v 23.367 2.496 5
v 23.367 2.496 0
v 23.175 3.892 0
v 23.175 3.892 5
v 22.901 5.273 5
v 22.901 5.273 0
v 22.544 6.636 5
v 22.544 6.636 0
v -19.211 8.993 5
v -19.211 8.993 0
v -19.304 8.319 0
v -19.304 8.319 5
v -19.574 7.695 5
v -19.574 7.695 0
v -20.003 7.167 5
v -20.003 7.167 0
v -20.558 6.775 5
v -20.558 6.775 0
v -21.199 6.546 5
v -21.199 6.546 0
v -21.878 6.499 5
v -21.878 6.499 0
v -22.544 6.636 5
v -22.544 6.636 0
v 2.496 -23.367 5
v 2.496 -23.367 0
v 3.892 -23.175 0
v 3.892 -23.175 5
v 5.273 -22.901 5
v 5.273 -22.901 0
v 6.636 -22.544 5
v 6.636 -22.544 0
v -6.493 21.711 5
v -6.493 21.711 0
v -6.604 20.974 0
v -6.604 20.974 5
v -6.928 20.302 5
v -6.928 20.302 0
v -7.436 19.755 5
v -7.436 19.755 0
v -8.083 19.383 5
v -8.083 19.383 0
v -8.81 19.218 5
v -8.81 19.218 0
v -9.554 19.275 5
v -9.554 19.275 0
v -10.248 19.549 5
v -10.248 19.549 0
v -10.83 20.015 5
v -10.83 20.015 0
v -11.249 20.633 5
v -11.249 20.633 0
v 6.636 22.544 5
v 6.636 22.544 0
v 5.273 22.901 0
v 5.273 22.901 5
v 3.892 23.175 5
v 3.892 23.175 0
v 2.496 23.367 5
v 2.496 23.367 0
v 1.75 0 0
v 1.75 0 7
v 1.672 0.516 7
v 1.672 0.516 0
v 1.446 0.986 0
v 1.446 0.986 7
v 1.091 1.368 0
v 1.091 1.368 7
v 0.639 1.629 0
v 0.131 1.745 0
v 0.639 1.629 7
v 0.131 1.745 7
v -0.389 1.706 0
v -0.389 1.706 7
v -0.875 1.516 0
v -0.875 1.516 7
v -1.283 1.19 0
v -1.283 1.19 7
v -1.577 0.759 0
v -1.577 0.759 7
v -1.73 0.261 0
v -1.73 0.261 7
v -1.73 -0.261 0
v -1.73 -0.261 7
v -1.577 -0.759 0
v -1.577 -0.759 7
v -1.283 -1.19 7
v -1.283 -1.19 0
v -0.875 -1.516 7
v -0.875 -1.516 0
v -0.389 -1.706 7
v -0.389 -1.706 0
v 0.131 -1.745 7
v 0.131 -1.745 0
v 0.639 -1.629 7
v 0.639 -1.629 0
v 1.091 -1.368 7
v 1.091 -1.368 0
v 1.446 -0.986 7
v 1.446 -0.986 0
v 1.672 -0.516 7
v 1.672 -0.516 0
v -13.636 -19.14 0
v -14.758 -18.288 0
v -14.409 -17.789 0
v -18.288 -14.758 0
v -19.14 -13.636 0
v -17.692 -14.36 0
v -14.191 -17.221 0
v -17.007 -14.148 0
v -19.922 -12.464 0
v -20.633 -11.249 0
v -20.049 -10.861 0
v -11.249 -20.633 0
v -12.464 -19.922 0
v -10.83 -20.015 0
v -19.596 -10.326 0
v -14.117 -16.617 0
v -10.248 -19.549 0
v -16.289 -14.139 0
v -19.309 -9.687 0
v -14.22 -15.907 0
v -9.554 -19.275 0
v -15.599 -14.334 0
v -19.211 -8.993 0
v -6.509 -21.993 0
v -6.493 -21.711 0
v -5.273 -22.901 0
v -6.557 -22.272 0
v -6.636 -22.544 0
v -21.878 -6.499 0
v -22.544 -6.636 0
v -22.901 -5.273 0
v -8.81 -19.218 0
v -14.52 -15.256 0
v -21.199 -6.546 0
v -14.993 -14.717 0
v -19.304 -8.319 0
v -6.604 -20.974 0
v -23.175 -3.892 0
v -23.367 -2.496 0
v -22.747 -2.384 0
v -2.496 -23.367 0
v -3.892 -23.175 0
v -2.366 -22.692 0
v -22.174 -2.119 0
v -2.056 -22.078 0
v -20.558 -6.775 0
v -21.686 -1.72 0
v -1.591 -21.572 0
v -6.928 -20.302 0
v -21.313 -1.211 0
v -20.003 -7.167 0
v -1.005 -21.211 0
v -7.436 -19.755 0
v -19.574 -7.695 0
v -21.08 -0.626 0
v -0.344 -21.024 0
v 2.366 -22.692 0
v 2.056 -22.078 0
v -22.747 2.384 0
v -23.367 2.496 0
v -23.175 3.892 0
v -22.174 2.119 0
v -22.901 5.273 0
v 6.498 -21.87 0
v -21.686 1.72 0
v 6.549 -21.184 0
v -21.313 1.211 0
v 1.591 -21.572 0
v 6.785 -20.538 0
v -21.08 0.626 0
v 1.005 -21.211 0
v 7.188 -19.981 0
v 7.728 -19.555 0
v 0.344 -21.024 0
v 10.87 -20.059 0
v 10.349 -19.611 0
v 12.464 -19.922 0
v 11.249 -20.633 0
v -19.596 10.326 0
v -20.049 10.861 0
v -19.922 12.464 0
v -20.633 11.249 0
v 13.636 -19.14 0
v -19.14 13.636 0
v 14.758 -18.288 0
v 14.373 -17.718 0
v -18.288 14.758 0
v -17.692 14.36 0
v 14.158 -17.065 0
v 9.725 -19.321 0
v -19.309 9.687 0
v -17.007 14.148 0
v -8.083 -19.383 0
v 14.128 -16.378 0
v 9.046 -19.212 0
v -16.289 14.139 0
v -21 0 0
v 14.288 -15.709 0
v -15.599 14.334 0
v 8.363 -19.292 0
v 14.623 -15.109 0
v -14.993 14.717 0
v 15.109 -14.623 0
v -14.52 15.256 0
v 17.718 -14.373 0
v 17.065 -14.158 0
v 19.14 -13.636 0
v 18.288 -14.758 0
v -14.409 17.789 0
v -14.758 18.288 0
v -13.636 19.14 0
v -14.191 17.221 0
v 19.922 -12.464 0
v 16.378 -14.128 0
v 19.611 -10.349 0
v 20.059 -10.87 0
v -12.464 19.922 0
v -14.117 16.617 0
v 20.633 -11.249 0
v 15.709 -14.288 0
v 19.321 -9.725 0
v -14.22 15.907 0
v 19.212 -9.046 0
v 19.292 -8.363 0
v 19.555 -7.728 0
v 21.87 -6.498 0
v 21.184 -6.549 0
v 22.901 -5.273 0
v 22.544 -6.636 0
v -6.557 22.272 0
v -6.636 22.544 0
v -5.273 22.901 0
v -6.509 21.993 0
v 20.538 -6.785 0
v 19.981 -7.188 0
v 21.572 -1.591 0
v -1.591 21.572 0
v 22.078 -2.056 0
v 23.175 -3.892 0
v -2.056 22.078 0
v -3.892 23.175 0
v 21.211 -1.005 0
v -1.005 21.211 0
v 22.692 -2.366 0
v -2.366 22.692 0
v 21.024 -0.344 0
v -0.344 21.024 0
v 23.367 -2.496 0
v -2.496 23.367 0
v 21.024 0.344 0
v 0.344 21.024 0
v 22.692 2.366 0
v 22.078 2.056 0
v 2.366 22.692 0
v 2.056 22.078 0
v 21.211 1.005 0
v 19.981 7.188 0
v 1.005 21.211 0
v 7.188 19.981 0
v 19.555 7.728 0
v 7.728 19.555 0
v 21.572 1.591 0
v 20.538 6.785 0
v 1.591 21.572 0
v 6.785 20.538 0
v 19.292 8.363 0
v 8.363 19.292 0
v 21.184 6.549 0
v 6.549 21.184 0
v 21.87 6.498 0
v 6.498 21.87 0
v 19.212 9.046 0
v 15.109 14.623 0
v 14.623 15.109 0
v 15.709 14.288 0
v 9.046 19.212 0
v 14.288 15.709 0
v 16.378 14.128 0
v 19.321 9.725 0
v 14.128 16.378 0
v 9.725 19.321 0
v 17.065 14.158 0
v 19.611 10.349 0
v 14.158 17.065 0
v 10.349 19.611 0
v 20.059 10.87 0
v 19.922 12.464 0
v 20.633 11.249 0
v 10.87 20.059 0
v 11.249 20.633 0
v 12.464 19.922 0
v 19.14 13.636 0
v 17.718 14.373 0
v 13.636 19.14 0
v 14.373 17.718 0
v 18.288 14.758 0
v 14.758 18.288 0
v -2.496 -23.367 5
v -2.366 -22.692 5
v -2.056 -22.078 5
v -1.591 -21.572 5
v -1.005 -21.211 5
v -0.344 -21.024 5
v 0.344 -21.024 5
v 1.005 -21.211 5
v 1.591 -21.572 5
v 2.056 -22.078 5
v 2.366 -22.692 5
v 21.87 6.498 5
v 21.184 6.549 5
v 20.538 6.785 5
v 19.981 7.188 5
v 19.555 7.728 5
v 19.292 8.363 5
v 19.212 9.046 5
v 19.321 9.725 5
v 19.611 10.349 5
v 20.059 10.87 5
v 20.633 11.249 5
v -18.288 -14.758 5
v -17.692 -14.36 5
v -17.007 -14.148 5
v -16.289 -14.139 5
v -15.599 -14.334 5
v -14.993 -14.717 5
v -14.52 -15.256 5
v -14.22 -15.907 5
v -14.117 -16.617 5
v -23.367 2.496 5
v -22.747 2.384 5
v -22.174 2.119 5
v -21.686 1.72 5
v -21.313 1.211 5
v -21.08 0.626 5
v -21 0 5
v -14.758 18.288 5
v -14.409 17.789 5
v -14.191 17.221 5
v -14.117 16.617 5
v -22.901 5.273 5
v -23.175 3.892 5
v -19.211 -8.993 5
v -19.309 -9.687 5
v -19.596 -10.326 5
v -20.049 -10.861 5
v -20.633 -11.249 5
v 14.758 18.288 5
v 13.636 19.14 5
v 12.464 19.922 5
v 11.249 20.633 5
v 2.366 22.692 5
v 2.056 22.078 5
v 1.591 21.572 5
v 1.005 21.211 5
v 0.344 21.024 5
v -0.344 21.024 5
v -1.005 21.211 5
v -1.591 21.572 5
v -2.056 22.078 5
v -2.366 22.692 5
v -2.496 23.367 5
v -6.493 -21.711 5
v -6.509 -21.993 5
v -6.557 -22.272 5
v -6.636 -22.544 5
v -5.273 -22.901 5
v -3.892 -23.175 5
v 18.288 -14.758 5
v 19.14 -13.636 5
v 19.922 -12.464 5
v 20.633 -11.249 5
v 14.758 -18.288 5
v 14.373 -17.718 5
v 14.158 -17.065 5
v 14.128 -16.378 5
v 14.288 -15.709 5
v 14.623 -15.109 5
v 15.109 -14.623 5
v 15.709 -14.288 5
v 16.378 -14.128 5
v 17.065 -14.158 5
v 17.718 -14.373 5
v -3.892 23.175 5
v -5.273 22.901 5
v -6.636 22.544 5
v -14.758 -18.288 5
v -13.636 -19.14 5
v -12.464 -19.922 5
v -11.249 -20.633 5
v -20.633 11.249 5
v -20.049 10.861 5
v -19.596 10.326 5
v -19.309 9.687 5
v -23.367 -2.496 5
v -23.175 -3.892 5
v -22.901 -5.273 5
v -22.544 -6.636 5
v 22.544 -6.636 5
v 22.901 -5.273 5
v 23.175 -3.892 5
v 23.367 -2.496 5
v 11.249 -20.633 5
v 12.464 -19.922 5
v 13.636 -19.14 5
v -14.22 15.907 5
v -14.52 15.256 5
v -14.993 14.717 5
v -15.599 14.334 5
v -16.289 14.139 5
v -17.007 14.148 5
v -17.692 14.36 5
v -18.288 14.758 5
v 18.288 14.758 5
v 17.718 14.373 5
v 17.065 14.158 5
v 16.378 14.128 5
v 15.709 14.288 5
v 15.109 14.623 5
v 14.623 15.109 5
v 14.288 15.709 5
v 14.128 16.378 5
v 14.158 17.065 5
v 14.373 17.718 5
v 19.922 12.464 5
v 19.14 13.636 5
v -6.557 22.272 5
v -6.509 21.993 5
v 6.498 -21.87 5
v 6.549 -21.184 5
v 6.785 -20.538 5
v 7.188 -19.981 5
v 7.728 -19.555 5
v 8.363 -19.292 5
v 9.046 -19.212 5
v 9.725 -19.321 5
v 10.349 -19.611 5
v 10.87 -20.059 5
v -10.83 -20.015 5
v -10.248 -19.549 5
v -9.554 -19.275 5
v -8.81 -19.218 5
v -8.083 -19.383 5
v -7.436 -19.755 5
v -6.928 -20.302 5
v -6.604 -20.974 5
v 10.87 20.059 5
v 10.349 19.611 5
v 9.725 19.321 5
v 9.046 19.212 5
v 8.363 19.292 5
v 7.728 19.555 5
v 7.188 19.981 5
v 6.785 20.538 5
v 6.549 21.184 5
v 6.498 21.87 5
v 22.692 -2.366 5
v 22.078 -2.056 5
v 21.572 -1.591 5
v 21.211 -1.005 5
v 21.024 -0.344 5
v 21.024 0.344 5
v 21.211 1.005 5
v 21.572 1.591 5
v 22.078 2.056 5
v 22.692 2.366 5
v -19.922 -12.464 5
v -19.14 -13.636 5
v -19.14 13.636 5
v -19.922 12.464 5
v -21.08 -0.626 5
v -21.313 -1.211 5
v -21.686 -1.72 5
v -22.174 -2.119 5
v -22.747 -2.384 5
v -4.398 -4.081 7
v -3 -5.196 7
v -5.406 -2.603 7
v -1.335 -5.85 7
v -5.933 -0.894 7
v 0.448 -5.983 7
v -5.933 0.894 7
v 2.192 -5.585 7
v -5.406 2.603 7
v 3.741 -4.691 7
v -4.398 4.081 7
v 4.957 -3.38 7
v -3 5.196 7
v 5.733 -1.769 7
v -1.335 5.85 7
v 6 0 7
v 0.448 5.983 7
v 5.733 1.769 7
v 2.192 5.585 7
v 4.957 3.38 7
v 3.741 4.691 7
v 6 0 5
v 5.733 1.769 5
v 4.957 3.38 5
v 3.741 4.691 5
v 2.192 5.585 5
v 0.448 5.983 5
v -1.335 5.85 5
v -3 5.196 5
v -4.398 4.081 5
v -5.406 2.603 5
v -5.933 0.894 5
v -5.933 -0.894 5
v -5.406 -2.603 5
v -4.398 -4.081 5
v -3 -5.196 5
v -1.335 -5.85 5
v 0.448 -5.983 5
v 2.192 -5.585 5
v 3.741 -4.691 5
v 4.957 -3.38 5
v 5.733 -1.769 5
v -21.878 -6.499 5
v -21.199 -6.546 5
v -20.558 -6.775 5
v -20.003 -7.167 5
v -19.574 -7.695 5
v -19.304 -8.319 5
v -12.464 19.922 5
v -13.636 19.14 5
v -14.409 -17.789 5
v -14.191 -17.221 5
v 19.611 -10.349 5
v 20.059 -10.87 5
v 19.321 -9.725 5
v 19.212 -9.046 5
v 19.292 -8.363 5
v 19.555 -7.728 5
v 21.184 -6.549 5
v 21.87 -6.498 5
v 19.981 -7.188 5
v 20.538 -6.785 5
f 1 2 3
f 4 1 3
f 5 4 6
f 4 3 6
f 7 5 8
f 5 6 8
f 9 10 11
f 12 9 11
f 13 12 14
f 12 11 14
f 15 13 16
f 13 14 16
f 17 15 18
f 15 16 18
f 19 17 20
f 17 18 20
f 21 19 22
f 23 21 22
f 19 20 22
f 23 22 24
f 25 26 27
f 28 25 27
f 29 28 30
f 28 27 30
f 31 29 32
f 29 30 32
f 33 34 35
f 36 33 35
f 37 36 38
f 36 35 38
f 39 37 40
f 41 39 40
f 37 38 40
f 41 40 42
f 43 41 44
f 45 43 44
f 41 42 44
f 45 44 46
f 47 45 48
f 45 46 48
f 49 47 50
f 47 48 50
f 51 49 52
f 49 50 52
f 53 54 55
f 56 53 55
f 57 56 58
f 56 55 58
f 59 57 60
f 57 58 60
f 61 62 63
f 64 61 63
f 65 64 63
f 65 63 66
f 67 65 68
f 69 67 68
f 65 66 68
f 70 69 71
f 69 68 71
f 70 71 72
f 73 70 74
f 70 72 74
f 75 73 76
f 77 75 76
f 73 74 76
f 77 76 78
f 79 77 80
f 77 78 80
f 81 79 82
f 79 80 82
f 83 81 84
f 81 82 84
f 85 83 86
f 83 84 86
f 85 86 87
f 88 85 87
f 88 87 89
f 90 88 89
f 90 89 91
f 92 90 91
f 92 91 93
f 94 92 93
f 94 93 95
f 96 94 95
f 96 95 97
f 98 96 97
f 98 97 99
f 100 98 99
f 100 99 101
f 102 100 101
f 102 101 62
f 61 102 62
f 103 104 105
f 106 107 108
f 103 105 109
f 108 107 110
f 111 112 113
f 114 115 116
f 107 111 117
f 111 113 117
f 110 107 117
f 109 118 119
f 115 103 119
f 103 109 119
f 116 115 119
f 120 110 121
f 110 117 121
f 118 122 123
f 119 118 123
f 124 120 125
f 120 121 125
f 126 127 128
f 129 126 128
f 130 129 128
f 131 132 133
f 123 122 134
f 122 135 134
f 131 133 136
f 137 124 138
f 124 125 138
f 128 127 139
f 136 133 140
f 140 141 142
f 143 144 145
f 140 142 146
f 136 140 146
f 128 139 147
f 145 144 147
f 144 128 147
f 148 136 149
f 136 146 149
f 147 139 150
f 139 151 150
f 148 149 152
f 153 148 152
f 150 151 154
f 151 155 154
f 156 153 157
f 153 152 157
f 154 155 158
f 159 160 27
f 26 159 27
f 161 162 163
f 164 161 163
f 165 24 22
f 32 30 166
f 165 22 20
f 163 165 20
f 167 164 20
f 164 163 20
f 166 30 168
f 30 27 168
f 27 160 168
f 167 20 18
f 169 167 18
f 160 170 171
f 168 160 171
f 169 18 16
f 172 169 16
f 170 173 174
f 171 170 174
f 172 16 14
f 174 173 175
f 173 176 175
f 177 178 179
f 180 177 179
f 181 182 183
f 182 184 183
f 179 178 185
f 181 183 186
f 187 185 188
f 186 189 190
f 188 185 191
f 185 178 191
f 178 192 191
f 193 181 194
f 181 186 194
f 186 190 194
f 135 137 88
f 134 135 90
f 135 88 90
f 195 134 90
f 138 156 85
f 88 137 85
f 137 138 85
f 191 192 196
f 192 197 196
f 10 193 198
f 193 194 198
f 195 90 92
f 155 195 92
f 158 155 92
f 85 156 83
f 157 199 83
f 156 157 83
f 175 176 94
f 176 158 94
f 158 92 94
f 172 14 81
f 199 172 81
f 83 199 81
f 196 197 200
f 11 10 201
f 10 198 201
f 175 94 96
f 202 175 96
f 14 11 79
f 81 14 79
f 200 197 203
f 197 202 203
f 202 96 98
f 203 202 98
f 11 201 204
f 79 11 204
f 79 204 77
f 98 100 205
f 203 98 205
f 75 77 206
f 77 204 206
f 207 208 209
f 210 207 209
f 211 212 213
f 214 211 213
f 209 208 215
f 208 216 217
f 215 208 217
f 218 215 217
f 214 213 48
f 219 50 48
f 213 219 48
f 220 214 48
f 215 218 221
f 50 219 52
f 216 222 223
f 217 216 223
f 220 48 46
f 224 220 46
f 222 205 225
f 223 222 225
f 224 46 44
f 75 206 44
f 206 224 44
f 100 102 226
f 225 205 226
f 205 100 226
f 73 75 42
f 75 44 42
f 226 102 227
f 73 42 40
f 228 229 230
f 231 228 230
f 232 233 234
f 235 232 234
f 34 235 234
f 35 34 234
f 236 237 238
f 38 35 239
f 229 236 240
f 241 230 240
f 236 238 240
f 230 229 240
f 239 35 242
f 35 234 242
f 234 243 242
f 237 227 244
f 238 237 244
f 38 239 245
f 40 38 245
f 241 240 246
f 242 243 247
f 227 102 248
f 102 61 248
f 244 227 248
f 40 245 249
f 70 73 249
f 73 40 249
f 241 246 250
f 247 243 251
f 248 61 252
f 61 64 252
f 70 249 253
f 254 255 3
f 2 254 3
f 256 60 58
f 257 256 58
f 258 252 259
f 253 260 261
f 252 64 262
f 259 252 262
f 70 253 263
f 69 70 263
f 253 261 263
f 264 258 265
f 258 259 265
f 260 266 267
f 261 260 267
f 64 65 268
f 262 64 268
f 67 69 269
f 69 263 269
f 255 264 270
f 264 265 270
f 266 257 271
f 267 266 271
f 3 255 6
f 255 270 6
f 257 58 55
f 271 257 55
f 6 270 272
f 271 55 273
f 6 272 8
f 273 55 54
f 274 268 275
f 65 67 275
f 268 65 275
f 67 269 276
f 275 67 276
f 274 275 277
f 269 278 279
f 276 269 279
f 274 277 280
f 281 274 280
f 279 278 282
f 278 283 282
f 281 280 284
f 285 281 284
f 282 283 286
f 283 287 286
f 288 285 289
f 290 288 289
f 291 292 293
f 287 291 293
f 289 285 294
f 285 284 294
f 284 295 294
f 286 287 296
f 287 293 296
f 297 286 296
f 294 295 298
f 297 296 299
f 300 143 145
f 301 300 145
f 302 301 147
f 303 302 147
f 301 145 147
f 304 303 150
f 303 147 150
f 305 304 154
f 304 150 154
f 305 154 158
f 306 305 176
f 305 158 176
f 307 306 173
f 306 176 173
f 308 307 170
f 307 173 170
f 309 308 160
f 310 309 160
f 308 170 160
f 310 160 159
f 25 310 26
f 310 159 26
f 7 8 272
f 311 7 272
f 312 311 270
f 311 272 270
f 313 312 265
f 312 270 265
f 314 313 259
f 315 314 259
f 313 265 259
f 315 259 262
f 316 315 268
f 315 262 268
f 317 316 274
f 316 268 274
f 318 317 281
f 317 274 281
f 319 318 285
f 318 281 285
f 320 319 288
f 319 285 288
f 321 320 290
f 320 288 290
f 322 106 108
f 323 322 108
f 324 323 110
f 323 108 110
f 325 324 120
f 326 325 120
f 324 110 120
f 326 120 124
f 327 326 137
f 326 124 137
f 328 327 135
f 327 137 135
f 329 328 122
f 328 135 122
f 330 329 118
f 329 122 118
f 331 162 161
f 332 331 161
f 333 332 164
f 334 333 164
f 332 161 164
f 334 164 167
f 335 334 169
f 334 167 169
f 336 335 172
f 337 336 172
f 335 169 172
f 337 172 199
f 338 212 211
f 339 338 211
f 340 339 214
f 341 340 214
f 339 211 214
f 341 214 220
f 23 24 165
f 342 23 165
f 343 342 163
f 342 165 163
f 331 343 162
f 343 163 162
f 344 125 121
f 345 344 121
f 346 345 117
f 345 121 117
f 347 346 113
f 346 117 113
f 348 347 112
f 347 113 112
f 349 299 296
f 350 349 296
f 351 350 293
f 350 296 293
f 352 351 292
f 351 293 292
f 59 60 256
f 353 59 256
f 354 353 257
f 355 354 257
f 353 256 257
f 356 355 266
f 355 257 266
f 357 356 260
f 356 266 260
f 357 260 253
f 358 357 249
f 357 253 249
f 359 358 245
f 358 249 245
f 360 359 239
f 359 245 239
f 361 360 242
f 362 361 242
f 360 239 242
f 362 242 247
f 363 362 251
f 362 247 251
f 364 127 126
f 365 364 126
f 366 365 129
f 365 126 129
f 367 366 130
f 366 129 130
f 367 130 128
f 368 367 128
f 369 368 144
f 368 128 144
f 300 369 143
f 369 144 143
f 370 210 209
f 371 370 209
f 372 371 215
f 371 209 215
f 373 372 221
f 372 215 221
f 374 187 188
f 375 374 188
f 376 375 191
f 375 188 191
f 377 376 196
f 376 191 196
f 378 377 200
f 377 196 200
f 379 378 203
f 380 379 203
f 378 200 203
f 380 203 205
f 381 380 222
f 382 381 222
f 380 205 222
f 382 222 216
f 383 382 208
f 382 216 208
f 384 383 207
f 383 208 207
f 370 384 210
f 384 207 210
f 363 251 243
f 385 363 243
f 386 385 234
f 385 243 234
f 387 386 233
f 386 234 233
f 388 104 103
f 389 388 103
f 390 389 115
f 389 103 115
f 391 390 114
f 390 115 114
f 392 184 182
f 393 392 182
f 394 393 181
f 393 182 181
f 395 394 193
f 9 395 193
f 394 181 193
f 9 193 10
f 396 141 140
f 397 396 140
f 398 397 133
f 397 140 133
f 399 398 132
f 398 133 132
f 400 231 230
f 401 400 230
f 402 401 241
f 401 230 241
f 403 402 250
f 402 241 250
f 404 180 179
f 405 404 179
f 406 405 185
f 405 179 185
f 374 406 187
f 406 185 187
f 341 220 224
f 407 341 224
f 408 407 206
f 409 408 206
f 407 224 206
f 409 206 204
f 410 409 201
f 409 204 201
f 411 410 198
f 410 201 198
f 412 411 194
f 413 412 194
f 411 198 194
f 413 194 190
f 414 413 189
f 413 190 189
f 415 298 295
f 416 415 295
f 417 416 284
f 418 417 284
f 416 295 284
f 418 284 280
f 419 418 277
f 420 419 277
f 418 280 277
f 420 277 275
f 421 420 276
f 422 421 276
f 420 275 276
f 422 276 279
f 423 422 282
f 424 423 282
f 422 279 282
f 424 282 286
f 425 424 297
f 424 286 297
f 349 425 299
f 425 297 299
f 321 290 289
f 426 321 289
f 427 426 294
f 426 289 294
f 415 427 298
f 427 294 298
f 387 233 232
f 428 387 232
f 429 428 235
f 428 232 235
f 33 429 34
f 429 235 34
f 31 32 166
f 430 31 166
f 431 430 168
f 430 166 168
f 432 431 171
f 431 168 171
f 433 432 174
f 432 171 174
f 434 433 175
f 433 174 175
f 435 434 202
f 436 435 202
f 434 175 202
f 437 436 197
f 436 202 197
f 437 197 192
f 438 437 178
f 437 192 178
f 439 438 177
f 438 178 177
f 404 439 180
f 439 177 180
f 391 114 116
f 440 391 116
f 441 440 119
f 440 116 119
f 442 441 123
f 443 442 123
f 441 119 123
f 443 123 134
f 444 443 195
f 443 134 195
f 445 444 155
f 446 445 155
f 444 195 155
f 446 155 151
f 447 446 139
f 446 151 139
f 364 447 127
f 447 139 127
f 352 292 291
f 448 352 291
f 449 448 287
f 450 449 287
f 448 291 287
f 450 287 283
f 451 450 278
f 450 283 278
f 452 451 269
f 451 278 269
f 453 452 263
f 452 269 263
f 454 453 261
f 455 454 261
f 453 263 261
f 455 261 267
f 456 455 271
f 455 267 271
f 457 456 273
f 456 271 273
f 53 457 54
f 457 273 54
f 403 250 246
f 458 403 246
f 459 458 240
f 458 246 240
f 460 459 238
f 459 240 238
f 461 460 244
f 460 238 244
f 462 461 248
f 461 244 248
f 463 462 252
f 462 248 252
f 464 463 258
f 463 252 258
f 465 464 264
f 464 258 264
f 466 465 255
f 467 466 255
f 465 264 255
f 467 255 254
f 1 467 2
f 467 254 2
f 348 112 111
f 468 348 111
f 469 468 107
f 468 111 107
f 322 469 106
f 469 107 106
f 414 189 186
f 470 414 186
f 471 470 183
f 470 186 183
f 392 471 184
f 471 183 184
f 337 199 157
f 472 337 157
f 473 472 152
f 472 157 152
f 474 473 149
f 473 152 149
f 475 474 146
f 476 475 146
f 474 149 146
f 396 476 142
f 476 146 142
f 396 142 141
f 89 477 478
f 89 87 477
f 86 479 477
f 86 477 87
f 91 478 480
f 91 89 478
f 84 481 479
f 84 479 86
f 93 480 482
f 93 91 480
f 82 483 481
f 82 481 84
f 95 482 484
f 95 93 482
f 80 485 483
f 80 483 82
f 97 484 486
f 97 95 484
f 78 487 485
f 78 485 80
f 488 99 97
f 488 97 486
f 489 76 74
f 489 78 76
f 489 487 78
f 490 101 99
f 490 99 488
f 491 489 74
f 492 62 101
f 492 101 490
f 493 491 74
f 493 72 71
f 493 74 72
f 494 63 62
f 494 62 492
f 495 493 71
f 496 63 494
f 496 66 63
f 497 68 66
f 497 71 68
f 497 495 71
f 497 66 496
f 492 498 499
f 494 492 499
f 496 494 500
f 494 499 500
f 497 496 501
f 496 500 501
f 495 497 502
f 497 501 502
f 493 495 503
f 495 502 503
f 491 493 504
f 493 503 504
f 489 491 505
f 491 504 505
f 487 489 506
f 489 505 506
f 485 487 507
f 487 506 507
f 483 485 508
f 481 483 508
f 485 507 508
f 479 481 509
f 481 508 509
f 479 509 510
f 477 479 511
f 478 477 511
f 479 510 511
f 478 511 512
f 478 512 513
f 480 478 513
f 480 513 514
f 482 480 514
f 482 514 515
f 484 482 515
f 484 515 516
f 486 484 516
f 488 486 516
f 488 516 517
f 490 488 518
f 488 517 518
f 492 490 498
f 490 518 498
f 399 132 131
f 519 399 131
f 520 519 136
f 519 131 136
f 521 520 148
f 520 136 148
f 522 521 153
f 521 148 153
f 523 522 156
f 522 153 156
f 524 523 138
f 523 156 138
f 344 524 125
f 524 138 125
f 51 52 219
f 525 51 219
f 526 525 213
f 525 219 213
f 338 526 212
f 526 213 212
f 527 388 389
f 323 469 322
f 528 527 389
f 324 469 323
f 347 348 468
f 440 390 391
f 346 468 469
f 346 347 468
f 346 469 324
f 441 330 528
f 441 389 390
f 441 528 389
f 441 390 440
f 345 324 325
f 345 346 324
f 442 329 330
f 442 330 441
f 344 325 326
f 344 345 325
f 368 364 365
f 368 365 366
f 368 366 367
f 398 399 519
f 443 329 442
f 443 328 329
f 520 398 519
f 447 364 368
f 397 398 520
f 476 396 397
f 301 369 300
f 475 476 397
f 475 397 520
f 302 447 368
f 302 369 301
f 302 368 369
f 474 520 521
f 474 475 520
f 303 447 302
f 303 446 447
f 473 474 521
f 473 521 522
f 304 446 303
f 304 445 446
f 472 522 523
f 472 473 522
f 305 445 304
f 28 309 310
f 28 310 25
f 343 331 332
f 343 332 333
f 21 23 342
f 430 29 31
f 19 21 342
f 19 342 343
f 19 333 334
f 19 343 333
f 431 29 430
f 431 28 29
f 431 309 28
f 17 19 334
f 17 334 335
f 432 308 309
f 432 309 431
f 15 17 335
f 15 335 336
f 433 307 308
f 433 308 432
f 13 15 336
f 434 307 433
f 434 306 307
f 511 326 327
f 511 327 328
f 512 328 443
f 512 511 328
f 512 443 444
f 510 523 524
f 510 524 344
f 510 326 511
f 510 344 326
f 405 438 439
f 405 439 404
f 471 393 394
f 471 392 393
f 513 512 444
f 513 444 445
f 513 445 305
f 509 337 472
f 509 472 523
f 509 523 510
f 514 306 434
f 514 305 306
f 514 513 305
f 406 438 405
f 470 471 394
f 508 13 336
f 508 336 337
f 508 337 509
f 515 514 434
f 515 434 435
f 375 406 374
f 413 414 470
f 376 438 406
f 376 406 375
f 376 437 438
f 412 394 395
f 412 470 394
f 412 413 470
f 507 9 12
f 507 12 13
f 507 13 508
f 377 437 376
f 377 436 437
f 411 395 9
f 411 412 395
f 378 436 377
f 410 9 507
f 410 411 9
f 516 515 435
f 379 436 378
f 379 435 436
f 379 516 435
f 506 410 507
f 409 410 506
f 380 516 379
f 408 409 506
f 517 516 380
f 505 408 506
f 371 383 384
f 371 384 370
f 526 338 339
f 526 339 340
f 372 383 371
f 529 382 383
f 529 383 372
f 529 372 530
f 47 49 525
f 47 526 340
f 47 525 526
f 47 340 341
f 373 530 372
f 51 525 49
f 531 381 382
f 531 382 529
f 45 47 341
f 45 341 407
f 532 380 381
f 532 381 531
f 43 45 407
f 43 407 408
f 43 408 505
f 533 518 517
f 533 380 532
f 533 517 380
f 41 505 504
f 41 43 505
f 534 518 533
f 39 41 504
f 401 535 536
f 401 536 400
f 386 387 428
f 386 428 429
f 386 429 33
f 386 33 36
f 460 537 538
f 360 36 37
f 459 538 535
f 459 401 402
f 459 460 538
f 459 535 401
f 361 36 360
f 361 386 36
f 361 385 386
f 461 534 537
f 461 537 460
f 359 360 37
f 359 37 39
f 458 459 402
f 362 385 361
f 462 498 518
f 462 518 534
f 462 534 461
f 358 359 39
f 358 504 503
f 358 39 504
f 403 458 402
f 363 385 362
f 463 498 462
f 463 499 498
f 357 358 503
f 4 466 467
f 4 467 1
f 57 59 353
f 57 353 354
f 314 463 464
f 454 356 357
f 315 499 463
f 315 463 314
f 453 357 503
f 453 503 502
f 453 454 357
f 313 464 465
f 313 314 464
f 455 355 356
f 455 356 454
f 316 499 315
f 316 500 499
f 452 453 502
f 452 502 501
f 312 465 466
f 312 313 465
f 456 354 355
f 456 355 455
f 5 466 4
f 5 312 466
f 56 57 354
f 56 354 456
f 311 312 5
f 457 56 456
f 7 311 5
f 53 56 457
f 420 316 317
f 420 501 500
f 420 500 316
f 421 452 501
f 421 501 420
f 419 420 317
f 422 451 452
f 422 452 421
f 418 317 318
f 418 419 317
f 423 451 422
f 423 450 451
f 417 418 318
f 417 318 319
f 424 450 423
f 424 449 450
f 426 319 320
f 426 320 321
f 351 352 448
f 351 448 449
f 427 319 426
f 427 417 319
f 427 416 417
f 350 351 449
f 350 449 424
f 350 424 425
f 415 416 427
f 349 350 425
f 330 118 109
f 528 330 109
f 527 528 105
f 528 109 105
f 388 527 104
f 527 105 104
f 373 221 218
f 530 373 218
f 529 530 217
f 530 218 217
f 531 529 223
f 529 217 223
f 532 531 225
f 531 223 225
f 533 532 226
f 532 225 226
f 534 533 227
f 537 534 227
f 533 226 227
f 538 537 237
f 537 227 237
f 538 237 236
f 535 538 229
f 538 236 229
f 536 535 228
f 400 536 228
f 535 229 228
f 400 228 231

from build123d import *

# Parameters (mm, degrees)
F1_DEPTH = 5
F2_R     = 6
F3_DEPTH = 2
F4_R     = 1.75
F5_DEPTH = 25


with BuildPart() as f1:
    # F0 (on Top) → F1 (new body)
    with BuildSketch(Plane.XY):
        with BuildLine():
            ThreePointArc((23.3670212736, -2.4964608548), (21, -2.53e-08), (23.3670212796, 2.4964607985))
            ThreePointArc((23.3670212796, 2.4964607985), (23.0484540943, 4.5846225431), (22.5436668971, 6.6357428244))
            ThreePointArc((22.5436668971, 6.6357428244), (19.40147019, 8.0363520621), (20.6329585055, 11.2486009491))
            ThreePointArc((20.6329585055, 11.2486009491), (19.5395358989, 13.0559004612), (18.2882435892, 14.7577148103))
            ThreePointArc((18.2882435892, 14.7577148103), (14.8492424139, 14.849242396), (14.7577148323, 18.2882435714))
            ThreePointArc((14.7577148323, 18.2882435714), (13.0559004848, 19.5395358832), (11.248600974, 20.6329584919))
            ThreePointArc((11.248600974, 20.6329584919), (8.0363520855, 19.4014701803), (6.6357428516, 22.5436668891))
            ThreePointArc((6.6357428516, 22.5436668891), (4.5846225709, 23.0484540888), (2.4964608267, 23.3670212766))
            ThreePointArc((2.4964608267, 23.3670212766), (0, 21), (-2.4964608267, 23.3670212766))
            ThreePointArc((-2.4964608267, 23.3670212766), (-4.5846225153, 23.0484540998), (-6.6357427429, 22.5436669211))
            ThreePointArc((-6.6357427429, 22.5436669211), (-6.5289892822, 22.1334873299), (-6.4930605625, 21.7111690547))
            ThreePointArc((-6.4930605625, 21.7111690547), (-8.440272529, 19.2730498225), (-11.2486008745, 20.6329585461))
            ThreePointArc((-11.2486008745, 20.6329585461), (-13.0559003906, 19.5395359461), (-14.7577147442, 18.2882436426))
            ThreePointArc((-14.7577147442, 18.2882436426), (-14.2826746546, 17.5119294358), (-14.1170092878, 16.617009428))
            ThreePointArc((-14.1170092878, 16.617009428), (-15.5991894549, 14.3335815688), (-18.2882435181, 14.7577148984))
            ThreePointArc((-18.2882435181, 14.7577148984), (-19.539535836, 13.0559005554), (-20.6329584512, 11.2486010486))
            ThreePointArc((-20.6329584512, 11.2486010486), (-19.5962781638, 10.3261912121), (-19.2111689788, 8.9930607456))
            ThreePointArc((-19.2111689788, 8.9930607456), (-20.267431592, 6.9520751117), (-22.5436668651, 6.6357429331))
            ThreePointArc((-22.5436668651, 6.6357429331), (-23.0484540722, 4.5846226542), (-23.3670212676, 2.4964609112))
            ThreePointArc((-23.3670212676, 2.4964609112), (-21.6858270712, 1.7201095537), (-21, 8.5e-08))
            ThreePointArc((-21, 8.5e-08), (-21.6858270774, -1.7201093903), (-23.3670212856, -2.4964607422))
            ThreePointArc((-23.3670212856, -2.4964607422), (-23.0484541054, -4.5846224875), (-22.5436669131, -6.6357427701))
            ThreePointArc((-22.5436669131, -6.6357427701), (-20.2674316496, -6.9520749599), (-19.2111690438, -8.9930605886))
            ThreePointArc((-19.2111690438, -8.9930605886), (-19.5962782336, -10.3261910627), (-20.6329585326, -11.2486008994))
            ThreePointArc((-20.6329585326, -11.2486008994), (-19.5395359304, -13.0559004141), (-18.2882436248, -14.7577147662))
            ThreePointArc((-18.2882436248, -14.7577147662), (-15.5991895668, -14.3335814524), (-14.1170094079, -16.6170093078))
            ThreePointArc((-14.1170094079, -16.6170093078), (-14.282674778, -17.5119293241), (-14.7577148764, -18.2882435359))
            ThreePointArc((-14.7577148764, -18.2882435359), (-13.0559005319, -19.5395358517), (-11.2486010237, -20.6329584648))
            ThreePointArc((-11.2486010237, -20.6329584648), (-8.4402726772, -19.2730497595), (-6.4930607194, -21.7111689896))
            ThreePointArc((-6.4930607194, -21.7111689896), (-6.5289894407, -22.1334872737), (-6.6357429059, -22.5436668731))
            ThreePointArc((-6.6357429059, -22.5436668731), (-4.5846226264, -23.0484540777), (-2.496460883, -23.3670212706))
            ThreePointArc((-2.496460883, -23.3670212706), (-5.06e-08, -21), (2.4964607704, -23.3670212826))
            ThreePointArc((2.4964607704, -23.3670212826), (4.5846225153, -23.0484540998), (6.6357427973, -22.5436669051))
            ThreePointArc((6.6357427973, -22.5436669051), (8.0363520388, -19.4014701997), (11.2486009242, -20.632958519))
            ThreePointArc((11.2486009242, -20.632958519), (13.0559004377, -19.5395359147), (14.7577147882, -18.288243607))
            ThreePointArc((14.7577147882, -18.288243607), (14.8492423781, -14.8492424318), (18.2882435536, -14.7577148544))
            ThreePointArc((18.2882435536, -14.7577148544), (19.5395358675, -13.0559005083), (20.6329584783, -11.2486009988))
            ThreePointArc((20.6329584783, -11.2486009988), (19.4014701706, -8.0363521089), (22.5436668811, -6.6357428788))
            ThreePointArc((22.5436668811, -6.6357428788), (23.0484540833, -4.5846225986), (23.3670212736, -2.4964608548))
        make_face()
    extrude(amount=F1_DEPTH)

    # F2 (on face) → F3 (join)
    with BuildSketch(Plane.XY.offset(5)):
        Circle(F2_R)
    extrude(amount=F3_DEPTH)

    # F4 (on face) → F5 (cut)
    with BuildSketch(Plane.XY.offset(7)):
        Circle(F4_R)
    extrude(amount=-F5_DEPTH, mode=Mode.SUBTRACT)


solid = f1.part
